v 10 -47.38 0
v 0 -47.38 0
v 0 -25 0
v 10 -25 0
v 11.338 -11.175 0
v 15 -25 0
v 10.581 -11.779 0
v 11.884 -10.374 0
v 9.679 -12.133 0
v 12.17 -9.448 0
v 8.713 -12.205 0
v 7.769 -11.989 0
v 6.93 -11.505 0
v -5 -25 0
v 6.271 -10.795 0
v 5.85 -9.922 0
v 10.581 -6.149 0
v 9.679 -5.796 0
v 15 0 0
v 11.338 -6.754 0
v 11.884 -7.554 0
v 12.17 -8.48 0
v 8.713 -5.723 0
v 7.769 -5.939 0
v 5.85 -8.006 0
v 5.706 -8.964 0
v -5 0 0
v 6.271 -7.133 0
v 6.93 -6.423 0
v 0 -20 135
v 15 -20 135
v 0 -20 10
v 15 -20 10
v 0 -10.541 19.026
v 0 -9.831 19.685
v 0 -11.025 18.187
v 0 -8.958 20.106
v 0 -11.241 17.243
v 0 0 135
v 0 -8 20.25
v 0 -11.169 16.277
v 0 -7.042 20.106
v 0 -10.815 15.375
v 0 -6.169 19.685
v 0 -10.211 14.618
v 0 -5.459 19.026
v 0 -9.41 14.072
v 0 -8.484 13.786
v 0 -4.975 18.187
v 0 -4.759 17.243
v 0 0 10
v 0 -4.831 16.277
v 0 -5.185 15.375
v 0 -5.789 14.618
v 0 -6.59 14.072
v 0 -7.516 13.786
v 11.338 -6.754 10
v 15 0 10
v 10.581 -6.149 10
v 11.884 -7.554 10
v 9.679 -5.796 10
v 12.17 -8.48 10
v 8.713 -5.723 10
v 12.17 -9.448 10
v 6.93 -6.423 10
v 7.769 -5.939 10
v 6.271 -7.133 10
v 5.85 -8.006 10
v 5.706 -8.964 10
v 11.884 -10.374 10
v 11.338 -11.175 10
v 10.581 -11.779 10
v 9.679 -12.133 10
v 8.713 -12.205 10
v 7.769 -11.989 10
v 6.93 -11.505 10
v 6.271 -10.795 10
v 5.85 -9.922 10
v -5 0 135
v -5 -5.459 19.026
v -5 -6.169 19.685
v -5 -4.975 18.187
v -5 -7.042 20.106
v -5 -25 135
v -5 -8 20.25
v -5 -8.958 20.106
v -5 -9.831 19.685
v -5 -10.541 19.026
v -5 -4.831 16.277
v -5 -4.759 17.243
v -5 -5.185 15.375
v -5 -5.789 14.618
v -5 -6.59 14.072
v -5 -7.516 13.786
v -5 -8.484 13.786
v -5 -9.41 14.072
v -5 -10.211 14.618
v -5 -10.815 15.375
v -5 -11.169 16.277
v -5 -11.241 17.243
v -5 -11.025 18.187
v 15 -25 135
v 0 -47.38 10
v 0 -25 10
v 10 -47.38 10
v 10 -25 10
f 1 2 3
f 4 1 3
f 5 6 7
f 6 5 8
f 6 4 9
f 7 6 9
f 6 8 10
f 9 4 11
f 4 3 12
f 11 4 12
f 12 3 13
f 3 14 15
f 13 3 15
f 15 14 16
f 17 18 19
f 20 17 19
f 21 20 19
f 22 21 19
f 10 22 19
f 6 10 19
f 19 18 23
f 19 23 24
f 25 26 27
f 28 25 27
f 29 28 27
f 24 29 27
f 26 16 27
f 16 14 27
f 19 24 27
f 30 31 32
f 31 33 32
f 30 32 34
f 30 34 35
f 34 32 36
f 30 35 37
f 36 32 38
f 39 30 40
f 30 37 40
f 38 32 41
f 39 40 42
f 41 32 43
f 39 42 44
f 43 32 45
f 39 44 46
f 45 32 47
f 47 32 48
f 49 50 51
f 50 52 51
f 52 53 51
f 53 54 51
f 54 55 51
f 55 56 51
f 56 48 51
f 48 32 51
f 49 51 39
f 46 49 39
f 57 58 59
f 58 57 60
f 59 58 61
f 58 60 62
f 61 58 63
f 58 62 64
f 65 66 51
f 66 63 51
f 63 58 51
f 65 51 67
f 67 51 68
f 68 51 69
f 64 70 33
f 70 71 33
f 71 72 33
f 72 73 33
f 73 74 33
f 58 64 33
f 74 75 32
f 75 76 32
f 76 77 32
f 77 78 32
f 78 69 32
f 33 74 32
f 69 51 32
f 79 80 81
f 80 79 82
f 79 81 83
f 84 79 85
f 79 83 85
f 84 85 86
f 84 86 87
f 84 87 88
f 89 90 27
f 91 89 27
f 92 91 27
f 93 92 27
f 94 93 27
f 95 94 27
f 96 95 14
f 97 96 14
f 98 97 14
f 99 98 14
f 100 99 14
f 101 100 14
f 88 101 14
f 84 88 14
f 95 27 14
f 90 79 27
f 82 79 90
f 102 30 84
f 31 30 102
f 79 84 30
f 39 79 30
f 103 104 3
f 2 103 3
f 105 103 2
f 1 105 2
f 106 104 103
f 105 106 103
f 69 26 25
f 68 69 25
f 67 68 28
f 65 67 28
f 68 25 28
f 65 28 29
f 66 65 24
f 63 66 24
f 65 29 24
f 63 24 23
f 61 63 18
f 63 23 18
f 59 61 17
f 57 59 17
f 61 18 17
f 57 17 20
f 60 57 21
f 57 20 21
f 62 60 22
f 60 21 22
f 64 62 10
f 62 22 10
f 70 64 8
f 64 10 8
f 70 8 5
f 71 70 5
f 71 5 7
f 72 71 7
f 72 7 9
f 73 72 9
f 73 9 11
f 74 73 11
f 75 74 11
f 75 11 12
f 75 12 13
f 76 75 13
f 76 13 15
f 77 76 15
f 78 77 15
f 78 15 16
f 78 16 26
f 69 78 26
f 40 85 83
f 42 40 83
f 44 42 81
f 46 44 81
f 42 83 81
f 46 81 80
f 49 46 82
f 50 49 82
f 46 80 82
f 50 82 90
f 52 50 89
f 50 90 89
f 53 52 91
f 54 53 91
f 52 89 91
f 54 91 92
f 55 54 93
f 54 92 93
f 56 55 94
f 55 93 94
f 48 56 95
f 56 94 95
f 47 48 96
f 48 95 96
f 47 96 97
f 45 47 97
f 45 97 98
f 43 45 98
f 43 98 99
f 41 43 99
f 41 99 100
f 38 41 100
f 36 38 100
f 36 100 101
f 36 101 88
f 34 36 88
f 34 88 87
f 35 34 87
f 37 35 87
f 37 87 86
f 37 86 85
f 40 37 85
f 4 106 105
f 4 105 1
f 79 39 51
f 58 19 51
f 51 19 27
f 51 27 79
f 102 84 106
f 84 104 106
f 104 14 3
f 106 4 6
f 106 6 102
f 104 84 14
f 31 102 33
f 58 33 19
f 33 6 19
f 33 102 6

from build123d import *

# Parameters (mm, degrees)
BOSS_EXTRUDE1_DEPTH      = 10
SKETCH2_W                = 30
SKETCH2_H                = 25
BOSS_EXTRUDE2_DEPTH      = 5
BOSS_EXTRUDE3_DEPTH      = 5
BOSS_EXTRUDE4_DEPTH      = 105
SKETCH7_R                = 3.25
CUT_EXTRUDE10_DEPTH      = 15
CUT_EXTRUDE10_DEPTH_BACK = 13
SKETCH8_R                = 3.25
CUT_EXTRUDE11_DEPTH      = 17
CUT_EXTRUDE11_DEPTH_BACK = 14


with BuildPart() as part:
    # Sketch1 → Boss-Extrude1 (new body)
    with BuildSketch(Plane(origin=(0, 0, 0), x_dir=(0, 0, -1), z_dir=(1, 0, 0))):
        Polygon((0, 0), (-10, 0), (-10, -20), (-30, -20), (-30, -25), (-10, -25), (-10, -47.38), (0, -47.38), align=None)
    extrude(amount=BOSS_EXTRUDE1_DEPTH)

    # Sketch2 → Boss-Extrude2 (add)
    with BuildSketch(Plane.ZY):
        with Locations((15, -12.5)):
            Rectangle(SKETCH2_W, SKETCH2_H)
    extrude(amount=BOSS_EXTRUDE2_DEPTH)

    # Sketch3 → Boss-Extrude3 (add)
    with BuildSketch(Plane(origin=(10, 0, 0), x_dir=(0, 0, -1), z_dir=(1, 0, 0))):
        Polygon((-10, 0), (-10, -20), (-30, -20), (-30, -25), (-10, -25), (0, -25), (0, 0), align=None)
    extrude(amount=BOSS_EXTRUDE3_DEPTH)

    # Sketch4 → Boss-Extrude4 (add)
    with BuildSketch(Plane.XY.offset(30)):
        Polygon((-5, 0), (-5, -25), (15, -25), (15, -20), (0, -20), (0, 0), align=None)
    extrude(amount=BOSS_EXTRUDE4_DEPTH)

    # Sketch7 → Cut-Extrude10 (cut, two sides)
    with BuildSketch(Plane(origin=(0, 0, 0), x_dir=(-1, 0, 0), z_dir=(0, 0, -1))) as cut_extrude10_sk:
        with Locations((-8.955912711, -8.964075593)):
            Circle(SKETCH7_R)
    extrude(amount=CUT_EXTRUDE10_DEPTH, mode=Mode.SUBTRACT)
    extrude(cut_extrude10_sk.sketch, amount=-CUT_EXTRUDE10_DEPTH_BACK, mode=Mode.SUBTRACT)

    # Sketch8 → Cut-Extrude11 (cut, two sides)
    with BuildSketch(Plane.ZY.offset(5)) as cut_extrude11_sk:
        with Locations((17, -8)):
            Circle(SKETCH8_R)
    extrude(amount=CUT_EXTRUDE11_DEPTH, mode=Mode.SUBTRACT)
    extrude(cut_extrude11_sk.sketch, amount=-CUT_EXTRUDE11_DEPTH_BACK, mode=Mode.SUBTRACT)


solid = part.part
